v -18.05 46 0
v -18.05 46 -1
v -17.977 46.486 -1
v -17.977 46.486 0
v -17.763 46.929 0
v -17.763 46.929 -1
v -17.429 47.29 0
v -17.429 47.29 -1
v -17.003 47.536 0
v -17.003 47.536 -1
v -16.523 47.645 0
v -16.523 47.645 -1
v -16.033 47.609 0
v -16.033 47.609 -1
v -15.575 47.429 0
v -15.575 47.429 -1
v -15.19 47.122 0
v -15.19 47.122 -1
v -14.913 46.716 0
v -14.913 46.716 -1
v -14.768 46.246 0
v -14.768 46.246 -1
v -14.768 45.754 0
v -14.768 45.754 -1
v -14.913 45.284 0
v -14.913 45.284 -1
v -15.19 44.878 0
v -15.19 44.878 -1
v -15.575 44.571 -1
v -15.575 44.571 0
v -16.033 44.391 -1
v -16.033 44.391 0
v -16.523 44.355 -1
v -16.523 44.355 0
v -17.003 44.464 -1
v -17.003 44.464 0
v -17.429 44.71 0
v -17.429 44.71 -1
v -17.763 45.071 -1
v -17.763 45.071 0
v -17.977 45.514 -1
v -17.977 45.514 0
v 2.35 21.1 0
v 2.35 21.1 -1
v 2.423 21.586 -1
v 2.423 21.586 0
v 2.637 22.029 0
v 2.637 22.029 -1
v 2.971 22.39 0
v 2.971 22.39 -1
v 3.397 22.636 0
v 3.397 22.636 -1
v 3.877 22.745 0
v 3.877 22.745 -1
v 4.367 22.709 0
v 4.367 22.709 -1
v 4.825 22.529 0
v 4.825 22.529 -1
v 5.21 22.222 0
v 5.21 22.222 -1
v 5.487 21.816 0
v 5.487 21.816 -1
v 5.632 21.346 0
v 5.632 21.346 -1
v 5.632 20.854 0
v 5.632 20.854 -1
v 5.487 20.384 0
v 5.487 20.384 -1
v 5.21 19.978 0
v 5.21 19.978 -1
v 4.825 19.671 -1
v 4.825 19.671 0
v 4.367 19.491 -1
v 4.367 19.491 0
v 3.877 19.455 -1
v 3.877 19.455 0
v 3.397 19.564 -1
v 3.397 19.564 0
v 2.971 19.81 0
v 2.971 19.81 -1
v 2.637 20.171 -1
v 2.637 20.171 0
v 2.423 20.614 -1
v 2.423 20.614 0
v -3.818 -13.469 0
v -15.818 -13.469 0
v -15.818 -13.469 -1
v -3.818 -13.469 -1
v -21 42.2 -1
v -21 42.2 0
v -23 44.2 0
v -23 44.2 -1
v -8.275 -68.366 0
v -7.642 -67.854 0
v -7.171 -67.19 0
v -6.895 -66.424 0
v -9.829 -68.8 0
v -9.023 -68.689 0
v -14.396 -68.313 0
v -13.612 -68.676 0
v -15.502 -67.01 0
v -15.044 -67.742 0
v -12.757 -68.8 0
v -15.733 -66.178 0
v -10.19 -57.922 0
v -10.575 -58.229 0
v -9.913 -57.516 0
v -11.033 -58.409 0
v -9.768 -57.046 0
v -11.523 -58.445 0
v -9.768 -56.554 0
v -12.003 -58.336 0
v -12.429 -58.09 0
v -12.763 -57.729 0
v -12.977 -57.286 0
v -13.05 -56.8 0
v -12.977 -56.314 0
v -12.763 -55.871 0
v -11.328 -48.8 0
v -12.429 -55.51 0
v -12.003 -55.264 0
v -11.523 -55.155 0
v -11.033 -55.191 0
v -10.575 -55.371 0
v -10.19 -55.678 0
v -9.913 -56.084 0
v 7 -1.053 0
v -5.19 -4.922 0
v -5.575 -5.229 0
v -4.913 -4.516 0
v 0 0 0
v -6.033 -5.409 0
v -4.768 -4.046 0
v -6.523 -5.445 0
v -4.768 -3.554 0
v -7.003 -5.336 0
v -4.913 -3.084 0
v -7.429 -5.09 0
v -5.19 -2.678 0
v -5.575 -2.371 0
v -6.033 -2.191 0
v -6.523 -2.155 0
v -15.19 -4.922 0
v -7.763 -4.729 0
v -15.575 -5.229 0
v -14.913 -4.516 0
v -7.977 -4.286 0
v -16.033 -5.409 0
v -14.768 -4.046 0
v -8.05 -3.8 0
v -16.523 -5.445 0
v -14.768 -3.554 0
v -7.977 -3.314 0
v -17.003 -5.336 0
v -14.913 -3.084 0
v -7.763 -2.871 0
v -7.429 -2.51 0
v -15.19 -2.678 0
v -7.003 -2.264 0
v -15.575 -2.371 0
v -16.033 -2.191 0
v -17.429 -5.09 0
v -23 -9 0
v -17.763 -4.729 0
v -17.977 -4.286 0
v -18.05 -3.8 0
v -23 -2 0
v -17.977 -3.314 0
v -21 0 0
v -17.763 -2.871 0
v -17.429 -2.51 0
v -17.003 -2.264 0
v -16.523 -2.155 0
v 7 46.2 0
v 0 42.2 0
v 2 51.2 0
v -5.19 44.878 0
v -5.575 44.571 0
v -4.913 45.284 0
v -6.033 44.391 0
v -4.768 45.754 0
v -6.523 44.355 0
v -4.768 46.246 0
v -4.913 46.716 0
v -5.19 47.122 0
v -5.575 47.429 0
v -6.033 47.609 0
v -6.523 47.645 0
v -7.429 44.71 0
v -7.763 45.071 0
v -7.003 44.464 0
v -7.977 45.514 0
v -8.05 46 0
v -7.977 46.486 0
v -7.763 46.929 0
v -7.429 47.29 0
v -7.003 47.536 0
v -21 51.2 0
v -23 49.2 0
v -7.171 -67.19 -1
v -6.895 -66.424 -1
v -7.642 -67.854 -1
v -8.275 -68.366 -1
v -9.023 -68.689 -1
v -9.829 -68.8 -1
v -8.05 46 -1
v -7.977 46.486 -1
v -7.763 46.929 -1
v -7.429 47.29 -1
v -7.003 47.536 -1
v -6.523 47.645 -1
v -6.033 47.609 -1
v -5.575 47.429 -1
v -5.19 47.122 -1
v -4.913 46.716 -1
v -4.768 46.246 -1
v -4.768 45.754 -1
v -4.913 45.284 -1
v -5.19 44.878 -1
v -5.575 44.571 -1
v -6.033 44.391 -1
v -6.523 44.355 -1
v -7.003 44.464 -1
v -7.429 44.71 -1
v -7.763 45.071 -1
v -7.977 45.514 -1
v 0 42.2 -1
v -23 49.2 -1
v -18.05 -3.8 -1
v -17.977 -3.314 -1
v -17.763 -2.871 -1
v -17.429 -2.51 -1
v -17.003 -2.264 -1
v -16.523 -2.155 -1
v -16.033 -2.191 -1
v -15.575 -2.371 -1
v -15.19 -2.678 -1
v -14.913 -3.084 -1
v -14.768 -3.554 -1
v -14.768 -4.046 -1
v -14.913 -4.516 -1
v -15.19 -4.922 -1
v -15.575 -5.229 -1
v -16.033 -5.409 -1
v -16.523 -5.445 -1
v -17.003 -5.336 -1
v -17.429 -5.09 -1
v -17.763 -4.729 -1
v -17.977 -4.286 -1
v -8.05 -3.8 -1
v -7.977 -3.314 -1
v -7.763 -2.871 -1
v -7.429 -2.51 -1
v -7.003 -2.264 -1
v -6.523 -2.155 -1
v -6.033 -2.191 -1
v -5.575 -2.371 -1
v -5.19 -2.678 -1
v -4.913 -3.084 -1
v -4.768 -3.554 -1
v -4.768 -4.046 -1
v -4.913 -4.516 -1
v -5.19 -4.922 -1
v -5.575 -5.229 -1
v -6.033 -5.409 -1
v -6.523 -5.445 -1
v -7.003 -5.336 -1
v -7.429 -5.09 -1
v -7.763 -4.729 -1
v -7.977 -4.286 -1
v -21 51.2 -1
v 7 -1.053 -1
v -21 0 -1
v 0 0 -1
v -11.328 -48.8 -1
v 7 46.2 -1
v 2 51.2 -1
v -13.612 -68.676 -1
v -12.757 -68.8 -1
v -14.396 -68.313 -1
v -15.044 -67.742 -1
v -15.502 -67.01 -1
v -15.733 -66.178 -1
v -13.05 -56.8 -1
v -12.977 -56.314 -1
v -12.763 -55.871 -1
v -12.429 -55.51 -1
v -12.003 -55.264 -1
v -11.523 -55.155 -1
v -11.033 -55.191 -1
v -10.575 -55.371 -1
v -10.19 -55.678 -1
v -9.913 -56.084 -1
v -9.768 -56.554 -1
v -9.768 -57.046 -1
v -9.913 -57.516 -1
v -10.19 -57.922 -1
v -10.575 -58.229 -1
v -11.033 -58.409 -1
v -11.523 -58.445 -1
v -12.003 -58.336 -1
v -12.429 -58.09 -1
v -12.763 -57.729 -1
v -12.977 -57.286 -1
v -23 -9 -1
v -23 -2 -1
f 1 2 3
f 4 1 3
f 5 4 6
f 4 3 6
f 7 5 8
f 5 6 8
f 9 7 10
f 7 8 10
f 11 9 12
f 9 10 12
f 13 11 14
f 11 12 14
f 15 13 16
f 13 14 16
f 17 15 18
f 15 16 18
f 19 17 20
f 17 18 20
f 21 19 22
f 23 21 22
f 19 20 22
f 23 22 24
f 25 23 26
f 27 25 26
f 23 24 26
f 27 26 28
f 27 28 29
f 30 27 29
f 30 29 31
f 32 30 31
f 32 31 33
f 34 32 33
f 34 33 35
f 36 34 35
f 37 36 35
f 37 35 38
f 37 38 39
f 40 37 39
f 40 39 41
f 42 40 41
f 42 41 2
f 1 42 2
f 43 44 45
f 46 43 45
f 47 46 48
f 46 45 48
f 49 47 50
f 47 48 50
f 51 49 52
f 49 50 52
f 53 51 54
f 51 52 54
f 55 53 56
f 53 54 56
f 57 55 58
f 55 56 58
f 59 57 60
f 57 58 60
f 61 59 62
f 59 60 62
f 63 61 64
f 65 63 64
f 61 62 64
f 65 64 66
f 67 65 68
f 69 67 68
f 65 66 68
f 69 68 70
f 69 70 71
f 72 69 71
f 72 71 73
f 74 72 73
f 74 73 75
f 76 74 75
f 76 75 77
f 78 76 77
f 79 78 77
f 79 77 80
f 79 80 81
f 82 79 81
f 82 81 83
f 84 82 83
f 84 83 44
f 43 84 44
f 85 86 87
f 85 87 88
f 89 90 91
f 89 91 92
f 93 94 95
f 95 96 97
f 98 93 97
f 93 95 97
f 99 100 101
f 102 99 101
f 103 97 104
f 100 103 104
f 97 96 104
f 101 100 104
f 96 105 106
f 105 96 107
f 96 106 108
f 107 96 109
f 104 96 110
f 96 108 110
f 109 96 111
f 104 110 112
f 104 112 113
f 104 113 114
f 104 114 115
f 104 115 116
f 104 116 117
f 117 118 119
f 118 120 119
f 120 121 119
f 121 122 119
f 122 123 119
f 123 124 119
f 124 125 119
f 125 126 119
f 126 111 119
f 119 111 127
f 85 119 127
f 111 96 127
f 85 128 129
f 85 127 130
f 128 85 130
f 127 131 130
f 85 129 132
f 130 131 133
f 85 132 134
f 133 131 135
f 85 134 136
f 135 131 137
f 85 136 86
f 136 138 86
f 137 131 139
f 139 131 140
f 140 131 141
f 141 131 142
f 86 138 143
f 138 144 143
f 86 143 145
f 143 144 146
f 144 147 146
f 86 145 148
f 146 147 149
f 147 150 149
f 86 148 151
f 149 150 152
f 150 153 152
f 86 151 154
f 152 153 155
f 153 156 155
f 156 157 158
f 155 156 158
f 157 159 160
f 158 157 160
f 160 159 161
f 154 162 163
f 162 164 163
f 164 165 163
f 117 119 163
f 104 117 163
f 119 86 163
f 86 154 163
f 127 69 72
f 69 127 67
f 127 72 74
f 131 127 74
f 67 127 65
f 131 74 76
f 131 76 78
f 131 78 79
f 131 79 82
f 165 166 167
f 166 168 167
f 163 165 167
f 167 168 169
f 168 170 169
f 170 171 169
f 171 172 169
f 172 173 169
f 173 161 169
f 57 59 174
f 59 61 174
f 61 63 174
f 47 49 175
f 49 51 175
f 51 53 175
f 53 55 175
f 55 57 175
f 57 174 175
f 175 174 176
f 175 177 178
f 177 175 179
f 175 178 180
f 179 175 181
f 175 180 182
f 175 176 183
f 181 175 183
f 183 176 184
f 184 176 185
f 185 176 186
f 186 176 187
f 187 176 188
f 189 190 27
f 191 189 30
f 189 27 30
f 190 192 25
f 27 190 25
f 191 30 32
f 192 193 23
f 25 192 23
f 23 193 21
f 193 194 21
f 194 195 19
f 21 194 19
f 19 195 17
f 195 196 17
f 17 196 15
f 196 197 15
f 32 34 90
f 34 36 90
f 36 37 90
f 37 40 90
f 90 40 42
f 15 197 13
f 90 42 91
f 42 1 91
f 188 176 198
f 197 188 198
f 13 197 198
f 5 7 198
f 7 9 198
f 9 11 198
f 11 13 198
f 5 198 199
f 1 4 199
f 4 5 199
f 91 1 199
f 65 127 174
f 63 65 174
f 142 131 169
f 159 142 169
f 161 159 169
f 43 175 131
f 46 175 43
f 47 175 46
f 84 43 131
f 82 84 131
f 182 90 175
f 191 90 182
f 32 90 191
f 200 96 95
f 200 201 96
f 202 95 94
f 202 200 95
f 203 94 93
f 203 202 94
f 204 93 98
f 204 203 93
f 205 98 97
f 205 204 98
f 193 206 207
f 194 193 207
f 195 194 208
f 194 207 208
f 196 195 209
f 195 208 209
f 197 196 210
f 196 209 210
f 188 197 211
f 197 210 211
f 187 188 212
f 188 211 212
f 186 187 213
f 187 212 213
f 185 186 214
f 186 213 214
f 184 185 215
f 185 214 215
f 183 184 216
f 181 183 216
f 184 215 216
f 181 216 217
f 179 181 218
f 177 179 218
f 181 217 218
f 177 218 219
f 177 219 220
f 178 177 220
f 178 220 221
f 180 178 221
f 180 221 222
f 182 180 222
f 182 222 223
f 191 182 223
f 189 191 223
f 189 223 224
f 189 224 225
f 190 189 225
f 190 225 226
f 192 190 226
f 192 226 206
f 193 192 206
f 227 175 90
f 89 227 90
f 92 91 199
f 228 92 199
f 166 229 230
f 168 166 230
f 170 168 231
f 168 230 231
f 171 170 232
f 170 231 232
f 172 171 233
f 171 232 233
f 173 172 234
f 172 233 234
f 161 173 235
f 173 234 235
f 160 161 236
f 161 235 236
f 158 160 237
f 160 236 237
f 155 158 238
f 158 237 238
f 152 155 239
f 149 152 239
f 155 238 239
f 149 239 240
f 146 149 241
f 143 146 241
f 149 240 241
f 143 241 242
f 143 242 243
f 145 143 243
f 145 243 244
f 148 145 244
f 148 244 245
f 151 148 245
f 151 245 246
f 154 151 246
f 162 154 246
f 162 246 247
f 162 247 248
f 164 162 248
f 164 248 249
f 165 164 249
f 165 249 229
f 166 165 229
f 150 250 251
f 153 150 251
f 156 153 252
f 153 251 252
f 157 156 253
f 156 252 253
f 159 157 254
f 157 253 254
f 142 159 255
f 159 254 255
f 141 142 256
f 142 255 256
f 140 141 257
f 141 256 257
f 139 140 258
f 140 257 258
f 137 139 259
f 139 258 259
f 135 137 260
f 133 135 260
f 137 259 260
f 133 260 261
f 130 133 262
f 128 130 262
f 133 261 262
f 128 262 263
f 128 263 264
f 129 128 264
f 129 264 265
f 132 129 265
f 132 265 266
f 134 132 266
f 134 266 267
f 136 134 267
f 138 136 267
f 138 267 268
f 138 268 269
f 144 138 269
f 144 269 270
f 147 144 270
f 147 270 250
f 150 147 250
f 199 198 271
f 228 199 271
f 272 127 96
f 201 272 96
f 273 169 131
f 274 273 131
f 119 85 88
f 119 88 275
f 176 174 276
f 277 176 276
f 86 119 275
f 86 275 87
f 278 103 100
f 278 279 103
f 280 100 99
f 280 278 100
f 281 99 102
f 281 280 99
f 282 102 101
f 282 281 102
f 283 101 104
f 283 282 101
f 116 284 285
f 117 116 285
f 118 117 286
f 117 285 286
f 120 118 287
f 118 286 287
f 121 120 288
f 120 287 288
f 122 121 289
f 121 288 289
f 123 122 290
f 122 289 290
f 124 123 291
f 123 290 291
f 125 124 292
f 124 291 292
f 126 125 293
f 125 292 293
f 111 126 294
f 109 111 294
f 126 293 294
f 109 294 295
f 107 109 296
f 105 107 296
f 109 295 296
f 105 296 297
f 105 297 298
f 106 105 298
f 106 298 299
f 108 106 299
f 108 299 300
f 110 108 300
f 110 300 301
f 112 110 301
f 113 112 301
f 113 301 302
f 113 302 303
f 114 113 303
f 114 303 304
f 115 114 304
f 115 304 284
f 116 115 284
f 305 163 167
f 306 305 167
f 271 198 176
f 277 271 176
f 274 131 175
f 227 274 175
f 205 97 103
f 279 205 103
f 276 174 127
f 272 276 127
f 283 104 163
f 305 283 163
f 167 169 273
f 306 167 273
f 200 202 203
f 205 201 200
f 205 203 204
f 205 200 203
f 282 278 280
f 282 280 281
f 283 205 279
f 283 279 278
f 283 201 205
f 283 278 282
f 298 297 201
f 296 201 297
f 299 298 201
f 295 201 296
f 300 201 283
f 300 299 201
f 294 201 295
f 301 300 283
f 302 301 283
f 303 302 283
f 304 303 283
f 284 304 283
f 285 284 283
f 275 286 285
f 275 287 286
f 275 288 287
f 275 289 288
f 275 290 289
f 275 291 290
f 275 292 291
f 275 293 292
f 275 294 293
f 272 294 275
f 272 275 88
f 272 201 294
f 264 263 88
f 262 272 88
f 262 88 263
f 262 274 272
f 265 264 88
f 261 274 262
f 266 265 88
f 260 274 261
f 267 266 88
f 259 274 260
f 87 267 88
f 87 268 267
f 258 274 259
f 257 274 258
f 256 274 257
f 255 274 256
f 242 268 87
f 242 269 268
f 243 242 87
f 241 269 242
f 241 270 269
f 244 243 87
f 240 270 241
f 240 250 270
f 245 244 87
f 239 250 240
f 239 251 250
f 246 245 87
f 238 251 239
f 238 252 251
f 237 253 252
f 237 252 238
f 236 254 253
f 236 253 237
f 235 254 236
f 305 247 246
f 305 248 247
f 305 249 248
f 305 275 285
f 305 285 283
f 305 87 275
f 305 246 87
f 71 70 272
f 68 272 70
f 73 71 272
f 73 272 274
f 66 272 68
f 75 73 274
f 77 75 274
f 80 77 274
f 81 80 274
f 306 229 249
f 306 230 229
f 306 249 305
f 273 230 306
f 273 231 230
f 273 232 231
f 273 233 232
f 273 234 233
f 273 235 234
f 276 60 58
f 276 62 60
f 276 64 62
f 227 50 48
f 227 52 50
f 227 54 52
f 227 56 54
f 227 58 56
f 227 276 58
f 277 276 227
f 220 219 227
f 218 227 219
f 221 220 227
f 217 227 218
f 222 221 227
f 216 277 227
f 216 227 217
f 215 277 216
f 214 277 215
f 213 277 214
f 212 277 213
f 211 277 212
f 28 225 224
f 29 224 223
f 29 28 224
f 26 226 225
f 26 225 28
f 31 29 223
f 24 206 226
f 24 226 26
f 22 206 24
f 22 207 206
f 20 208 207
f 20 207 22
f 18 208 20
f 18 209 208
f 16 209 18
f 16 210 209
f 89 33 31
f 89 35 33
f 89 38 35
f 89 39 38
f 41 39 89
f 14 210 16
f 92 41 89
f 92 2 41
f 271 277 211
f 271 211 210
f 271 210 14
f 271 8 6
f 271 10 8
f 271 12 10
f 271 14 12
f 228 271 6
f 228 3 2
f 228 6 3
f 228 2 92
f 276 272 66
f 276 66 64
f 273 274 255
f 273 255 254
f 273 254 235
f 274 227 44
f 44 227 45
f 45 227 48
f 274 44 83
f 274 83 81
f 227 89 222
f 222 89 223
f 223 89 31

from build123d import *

# Parameters (mm, degrees)
SM_BASE_FLANGE_1_DEPTH  = 1
HOLE_WIZARD_3_3_3_3_1_D = 3.3
CHAMFER_2_SIZE          = 5
FILLET_1_R              = 3
CHAMFER_3_SIZE          = 2


# Sheet-metal steps are written as plain solids
with BuildPart() as part:
    # Sketch 1 → 基体-法兰1 (new body)
    with BuildSketch(Plane.XY):
        Polygon((-23, 0), (0, 0), (0, 42.2), (-23, 42.2), (-23, 51.2), (7, 51.2), (7, -1.053326424), (-7.4, -68.8), (-15.4, -68.8), (-23, -9), align=None)
        Polygon((-15.817797263, -13.469186385), (-3.817797263, -13.469186385), (-11.327593526, -48.8), align=None, mode=Mode.SUBTRACT)
    extrude(amount=-SM_BASE_FLANGE_1_DEPTH)

    # Ø3.3 (3.3) 直径孔1 (through all)
    with Locations(Plane.XY):
        with Locations((-6.4, 46), (-16.4, 46), (-16.4, -3.8), (-6.4, -3.8), (4, 21.1), (-11.4, -56.8)):
            Hole(HOLE_WIZARD_3_3_3_3_1_D / 2)

    # 倒角2
    chamfer_2_edges = [part.edges().sort_by_distance(p)[0] for p in [
        (7, 51.2, -0.5),
    ]]
    chamfer(chamfer_2_edges, length=CHAMFER_2_SIZE)

    # 圆角1
    fillet_1_edges = [part.edges().sort_by_distance(p)[0] for p in [
        (-7.4, -68.8, -0.5),
        (-15.4, -68.8, -0.5),
    ]]
    fillet(fillet_1_edges, radius=FILLET_1_R)

    # 倒角3
    chamfer_3_edges = [part.edges().sort_by_distance(p)[0] for p in [
        (-23, 0, -0.5),
        (-23, 42.2, -0.5),
        (-23, 51.2, -0.5),
    ]]
    chamfer(chamfer_3_edges, length=CHAMFER_3_SIZE)


solid = part.part
